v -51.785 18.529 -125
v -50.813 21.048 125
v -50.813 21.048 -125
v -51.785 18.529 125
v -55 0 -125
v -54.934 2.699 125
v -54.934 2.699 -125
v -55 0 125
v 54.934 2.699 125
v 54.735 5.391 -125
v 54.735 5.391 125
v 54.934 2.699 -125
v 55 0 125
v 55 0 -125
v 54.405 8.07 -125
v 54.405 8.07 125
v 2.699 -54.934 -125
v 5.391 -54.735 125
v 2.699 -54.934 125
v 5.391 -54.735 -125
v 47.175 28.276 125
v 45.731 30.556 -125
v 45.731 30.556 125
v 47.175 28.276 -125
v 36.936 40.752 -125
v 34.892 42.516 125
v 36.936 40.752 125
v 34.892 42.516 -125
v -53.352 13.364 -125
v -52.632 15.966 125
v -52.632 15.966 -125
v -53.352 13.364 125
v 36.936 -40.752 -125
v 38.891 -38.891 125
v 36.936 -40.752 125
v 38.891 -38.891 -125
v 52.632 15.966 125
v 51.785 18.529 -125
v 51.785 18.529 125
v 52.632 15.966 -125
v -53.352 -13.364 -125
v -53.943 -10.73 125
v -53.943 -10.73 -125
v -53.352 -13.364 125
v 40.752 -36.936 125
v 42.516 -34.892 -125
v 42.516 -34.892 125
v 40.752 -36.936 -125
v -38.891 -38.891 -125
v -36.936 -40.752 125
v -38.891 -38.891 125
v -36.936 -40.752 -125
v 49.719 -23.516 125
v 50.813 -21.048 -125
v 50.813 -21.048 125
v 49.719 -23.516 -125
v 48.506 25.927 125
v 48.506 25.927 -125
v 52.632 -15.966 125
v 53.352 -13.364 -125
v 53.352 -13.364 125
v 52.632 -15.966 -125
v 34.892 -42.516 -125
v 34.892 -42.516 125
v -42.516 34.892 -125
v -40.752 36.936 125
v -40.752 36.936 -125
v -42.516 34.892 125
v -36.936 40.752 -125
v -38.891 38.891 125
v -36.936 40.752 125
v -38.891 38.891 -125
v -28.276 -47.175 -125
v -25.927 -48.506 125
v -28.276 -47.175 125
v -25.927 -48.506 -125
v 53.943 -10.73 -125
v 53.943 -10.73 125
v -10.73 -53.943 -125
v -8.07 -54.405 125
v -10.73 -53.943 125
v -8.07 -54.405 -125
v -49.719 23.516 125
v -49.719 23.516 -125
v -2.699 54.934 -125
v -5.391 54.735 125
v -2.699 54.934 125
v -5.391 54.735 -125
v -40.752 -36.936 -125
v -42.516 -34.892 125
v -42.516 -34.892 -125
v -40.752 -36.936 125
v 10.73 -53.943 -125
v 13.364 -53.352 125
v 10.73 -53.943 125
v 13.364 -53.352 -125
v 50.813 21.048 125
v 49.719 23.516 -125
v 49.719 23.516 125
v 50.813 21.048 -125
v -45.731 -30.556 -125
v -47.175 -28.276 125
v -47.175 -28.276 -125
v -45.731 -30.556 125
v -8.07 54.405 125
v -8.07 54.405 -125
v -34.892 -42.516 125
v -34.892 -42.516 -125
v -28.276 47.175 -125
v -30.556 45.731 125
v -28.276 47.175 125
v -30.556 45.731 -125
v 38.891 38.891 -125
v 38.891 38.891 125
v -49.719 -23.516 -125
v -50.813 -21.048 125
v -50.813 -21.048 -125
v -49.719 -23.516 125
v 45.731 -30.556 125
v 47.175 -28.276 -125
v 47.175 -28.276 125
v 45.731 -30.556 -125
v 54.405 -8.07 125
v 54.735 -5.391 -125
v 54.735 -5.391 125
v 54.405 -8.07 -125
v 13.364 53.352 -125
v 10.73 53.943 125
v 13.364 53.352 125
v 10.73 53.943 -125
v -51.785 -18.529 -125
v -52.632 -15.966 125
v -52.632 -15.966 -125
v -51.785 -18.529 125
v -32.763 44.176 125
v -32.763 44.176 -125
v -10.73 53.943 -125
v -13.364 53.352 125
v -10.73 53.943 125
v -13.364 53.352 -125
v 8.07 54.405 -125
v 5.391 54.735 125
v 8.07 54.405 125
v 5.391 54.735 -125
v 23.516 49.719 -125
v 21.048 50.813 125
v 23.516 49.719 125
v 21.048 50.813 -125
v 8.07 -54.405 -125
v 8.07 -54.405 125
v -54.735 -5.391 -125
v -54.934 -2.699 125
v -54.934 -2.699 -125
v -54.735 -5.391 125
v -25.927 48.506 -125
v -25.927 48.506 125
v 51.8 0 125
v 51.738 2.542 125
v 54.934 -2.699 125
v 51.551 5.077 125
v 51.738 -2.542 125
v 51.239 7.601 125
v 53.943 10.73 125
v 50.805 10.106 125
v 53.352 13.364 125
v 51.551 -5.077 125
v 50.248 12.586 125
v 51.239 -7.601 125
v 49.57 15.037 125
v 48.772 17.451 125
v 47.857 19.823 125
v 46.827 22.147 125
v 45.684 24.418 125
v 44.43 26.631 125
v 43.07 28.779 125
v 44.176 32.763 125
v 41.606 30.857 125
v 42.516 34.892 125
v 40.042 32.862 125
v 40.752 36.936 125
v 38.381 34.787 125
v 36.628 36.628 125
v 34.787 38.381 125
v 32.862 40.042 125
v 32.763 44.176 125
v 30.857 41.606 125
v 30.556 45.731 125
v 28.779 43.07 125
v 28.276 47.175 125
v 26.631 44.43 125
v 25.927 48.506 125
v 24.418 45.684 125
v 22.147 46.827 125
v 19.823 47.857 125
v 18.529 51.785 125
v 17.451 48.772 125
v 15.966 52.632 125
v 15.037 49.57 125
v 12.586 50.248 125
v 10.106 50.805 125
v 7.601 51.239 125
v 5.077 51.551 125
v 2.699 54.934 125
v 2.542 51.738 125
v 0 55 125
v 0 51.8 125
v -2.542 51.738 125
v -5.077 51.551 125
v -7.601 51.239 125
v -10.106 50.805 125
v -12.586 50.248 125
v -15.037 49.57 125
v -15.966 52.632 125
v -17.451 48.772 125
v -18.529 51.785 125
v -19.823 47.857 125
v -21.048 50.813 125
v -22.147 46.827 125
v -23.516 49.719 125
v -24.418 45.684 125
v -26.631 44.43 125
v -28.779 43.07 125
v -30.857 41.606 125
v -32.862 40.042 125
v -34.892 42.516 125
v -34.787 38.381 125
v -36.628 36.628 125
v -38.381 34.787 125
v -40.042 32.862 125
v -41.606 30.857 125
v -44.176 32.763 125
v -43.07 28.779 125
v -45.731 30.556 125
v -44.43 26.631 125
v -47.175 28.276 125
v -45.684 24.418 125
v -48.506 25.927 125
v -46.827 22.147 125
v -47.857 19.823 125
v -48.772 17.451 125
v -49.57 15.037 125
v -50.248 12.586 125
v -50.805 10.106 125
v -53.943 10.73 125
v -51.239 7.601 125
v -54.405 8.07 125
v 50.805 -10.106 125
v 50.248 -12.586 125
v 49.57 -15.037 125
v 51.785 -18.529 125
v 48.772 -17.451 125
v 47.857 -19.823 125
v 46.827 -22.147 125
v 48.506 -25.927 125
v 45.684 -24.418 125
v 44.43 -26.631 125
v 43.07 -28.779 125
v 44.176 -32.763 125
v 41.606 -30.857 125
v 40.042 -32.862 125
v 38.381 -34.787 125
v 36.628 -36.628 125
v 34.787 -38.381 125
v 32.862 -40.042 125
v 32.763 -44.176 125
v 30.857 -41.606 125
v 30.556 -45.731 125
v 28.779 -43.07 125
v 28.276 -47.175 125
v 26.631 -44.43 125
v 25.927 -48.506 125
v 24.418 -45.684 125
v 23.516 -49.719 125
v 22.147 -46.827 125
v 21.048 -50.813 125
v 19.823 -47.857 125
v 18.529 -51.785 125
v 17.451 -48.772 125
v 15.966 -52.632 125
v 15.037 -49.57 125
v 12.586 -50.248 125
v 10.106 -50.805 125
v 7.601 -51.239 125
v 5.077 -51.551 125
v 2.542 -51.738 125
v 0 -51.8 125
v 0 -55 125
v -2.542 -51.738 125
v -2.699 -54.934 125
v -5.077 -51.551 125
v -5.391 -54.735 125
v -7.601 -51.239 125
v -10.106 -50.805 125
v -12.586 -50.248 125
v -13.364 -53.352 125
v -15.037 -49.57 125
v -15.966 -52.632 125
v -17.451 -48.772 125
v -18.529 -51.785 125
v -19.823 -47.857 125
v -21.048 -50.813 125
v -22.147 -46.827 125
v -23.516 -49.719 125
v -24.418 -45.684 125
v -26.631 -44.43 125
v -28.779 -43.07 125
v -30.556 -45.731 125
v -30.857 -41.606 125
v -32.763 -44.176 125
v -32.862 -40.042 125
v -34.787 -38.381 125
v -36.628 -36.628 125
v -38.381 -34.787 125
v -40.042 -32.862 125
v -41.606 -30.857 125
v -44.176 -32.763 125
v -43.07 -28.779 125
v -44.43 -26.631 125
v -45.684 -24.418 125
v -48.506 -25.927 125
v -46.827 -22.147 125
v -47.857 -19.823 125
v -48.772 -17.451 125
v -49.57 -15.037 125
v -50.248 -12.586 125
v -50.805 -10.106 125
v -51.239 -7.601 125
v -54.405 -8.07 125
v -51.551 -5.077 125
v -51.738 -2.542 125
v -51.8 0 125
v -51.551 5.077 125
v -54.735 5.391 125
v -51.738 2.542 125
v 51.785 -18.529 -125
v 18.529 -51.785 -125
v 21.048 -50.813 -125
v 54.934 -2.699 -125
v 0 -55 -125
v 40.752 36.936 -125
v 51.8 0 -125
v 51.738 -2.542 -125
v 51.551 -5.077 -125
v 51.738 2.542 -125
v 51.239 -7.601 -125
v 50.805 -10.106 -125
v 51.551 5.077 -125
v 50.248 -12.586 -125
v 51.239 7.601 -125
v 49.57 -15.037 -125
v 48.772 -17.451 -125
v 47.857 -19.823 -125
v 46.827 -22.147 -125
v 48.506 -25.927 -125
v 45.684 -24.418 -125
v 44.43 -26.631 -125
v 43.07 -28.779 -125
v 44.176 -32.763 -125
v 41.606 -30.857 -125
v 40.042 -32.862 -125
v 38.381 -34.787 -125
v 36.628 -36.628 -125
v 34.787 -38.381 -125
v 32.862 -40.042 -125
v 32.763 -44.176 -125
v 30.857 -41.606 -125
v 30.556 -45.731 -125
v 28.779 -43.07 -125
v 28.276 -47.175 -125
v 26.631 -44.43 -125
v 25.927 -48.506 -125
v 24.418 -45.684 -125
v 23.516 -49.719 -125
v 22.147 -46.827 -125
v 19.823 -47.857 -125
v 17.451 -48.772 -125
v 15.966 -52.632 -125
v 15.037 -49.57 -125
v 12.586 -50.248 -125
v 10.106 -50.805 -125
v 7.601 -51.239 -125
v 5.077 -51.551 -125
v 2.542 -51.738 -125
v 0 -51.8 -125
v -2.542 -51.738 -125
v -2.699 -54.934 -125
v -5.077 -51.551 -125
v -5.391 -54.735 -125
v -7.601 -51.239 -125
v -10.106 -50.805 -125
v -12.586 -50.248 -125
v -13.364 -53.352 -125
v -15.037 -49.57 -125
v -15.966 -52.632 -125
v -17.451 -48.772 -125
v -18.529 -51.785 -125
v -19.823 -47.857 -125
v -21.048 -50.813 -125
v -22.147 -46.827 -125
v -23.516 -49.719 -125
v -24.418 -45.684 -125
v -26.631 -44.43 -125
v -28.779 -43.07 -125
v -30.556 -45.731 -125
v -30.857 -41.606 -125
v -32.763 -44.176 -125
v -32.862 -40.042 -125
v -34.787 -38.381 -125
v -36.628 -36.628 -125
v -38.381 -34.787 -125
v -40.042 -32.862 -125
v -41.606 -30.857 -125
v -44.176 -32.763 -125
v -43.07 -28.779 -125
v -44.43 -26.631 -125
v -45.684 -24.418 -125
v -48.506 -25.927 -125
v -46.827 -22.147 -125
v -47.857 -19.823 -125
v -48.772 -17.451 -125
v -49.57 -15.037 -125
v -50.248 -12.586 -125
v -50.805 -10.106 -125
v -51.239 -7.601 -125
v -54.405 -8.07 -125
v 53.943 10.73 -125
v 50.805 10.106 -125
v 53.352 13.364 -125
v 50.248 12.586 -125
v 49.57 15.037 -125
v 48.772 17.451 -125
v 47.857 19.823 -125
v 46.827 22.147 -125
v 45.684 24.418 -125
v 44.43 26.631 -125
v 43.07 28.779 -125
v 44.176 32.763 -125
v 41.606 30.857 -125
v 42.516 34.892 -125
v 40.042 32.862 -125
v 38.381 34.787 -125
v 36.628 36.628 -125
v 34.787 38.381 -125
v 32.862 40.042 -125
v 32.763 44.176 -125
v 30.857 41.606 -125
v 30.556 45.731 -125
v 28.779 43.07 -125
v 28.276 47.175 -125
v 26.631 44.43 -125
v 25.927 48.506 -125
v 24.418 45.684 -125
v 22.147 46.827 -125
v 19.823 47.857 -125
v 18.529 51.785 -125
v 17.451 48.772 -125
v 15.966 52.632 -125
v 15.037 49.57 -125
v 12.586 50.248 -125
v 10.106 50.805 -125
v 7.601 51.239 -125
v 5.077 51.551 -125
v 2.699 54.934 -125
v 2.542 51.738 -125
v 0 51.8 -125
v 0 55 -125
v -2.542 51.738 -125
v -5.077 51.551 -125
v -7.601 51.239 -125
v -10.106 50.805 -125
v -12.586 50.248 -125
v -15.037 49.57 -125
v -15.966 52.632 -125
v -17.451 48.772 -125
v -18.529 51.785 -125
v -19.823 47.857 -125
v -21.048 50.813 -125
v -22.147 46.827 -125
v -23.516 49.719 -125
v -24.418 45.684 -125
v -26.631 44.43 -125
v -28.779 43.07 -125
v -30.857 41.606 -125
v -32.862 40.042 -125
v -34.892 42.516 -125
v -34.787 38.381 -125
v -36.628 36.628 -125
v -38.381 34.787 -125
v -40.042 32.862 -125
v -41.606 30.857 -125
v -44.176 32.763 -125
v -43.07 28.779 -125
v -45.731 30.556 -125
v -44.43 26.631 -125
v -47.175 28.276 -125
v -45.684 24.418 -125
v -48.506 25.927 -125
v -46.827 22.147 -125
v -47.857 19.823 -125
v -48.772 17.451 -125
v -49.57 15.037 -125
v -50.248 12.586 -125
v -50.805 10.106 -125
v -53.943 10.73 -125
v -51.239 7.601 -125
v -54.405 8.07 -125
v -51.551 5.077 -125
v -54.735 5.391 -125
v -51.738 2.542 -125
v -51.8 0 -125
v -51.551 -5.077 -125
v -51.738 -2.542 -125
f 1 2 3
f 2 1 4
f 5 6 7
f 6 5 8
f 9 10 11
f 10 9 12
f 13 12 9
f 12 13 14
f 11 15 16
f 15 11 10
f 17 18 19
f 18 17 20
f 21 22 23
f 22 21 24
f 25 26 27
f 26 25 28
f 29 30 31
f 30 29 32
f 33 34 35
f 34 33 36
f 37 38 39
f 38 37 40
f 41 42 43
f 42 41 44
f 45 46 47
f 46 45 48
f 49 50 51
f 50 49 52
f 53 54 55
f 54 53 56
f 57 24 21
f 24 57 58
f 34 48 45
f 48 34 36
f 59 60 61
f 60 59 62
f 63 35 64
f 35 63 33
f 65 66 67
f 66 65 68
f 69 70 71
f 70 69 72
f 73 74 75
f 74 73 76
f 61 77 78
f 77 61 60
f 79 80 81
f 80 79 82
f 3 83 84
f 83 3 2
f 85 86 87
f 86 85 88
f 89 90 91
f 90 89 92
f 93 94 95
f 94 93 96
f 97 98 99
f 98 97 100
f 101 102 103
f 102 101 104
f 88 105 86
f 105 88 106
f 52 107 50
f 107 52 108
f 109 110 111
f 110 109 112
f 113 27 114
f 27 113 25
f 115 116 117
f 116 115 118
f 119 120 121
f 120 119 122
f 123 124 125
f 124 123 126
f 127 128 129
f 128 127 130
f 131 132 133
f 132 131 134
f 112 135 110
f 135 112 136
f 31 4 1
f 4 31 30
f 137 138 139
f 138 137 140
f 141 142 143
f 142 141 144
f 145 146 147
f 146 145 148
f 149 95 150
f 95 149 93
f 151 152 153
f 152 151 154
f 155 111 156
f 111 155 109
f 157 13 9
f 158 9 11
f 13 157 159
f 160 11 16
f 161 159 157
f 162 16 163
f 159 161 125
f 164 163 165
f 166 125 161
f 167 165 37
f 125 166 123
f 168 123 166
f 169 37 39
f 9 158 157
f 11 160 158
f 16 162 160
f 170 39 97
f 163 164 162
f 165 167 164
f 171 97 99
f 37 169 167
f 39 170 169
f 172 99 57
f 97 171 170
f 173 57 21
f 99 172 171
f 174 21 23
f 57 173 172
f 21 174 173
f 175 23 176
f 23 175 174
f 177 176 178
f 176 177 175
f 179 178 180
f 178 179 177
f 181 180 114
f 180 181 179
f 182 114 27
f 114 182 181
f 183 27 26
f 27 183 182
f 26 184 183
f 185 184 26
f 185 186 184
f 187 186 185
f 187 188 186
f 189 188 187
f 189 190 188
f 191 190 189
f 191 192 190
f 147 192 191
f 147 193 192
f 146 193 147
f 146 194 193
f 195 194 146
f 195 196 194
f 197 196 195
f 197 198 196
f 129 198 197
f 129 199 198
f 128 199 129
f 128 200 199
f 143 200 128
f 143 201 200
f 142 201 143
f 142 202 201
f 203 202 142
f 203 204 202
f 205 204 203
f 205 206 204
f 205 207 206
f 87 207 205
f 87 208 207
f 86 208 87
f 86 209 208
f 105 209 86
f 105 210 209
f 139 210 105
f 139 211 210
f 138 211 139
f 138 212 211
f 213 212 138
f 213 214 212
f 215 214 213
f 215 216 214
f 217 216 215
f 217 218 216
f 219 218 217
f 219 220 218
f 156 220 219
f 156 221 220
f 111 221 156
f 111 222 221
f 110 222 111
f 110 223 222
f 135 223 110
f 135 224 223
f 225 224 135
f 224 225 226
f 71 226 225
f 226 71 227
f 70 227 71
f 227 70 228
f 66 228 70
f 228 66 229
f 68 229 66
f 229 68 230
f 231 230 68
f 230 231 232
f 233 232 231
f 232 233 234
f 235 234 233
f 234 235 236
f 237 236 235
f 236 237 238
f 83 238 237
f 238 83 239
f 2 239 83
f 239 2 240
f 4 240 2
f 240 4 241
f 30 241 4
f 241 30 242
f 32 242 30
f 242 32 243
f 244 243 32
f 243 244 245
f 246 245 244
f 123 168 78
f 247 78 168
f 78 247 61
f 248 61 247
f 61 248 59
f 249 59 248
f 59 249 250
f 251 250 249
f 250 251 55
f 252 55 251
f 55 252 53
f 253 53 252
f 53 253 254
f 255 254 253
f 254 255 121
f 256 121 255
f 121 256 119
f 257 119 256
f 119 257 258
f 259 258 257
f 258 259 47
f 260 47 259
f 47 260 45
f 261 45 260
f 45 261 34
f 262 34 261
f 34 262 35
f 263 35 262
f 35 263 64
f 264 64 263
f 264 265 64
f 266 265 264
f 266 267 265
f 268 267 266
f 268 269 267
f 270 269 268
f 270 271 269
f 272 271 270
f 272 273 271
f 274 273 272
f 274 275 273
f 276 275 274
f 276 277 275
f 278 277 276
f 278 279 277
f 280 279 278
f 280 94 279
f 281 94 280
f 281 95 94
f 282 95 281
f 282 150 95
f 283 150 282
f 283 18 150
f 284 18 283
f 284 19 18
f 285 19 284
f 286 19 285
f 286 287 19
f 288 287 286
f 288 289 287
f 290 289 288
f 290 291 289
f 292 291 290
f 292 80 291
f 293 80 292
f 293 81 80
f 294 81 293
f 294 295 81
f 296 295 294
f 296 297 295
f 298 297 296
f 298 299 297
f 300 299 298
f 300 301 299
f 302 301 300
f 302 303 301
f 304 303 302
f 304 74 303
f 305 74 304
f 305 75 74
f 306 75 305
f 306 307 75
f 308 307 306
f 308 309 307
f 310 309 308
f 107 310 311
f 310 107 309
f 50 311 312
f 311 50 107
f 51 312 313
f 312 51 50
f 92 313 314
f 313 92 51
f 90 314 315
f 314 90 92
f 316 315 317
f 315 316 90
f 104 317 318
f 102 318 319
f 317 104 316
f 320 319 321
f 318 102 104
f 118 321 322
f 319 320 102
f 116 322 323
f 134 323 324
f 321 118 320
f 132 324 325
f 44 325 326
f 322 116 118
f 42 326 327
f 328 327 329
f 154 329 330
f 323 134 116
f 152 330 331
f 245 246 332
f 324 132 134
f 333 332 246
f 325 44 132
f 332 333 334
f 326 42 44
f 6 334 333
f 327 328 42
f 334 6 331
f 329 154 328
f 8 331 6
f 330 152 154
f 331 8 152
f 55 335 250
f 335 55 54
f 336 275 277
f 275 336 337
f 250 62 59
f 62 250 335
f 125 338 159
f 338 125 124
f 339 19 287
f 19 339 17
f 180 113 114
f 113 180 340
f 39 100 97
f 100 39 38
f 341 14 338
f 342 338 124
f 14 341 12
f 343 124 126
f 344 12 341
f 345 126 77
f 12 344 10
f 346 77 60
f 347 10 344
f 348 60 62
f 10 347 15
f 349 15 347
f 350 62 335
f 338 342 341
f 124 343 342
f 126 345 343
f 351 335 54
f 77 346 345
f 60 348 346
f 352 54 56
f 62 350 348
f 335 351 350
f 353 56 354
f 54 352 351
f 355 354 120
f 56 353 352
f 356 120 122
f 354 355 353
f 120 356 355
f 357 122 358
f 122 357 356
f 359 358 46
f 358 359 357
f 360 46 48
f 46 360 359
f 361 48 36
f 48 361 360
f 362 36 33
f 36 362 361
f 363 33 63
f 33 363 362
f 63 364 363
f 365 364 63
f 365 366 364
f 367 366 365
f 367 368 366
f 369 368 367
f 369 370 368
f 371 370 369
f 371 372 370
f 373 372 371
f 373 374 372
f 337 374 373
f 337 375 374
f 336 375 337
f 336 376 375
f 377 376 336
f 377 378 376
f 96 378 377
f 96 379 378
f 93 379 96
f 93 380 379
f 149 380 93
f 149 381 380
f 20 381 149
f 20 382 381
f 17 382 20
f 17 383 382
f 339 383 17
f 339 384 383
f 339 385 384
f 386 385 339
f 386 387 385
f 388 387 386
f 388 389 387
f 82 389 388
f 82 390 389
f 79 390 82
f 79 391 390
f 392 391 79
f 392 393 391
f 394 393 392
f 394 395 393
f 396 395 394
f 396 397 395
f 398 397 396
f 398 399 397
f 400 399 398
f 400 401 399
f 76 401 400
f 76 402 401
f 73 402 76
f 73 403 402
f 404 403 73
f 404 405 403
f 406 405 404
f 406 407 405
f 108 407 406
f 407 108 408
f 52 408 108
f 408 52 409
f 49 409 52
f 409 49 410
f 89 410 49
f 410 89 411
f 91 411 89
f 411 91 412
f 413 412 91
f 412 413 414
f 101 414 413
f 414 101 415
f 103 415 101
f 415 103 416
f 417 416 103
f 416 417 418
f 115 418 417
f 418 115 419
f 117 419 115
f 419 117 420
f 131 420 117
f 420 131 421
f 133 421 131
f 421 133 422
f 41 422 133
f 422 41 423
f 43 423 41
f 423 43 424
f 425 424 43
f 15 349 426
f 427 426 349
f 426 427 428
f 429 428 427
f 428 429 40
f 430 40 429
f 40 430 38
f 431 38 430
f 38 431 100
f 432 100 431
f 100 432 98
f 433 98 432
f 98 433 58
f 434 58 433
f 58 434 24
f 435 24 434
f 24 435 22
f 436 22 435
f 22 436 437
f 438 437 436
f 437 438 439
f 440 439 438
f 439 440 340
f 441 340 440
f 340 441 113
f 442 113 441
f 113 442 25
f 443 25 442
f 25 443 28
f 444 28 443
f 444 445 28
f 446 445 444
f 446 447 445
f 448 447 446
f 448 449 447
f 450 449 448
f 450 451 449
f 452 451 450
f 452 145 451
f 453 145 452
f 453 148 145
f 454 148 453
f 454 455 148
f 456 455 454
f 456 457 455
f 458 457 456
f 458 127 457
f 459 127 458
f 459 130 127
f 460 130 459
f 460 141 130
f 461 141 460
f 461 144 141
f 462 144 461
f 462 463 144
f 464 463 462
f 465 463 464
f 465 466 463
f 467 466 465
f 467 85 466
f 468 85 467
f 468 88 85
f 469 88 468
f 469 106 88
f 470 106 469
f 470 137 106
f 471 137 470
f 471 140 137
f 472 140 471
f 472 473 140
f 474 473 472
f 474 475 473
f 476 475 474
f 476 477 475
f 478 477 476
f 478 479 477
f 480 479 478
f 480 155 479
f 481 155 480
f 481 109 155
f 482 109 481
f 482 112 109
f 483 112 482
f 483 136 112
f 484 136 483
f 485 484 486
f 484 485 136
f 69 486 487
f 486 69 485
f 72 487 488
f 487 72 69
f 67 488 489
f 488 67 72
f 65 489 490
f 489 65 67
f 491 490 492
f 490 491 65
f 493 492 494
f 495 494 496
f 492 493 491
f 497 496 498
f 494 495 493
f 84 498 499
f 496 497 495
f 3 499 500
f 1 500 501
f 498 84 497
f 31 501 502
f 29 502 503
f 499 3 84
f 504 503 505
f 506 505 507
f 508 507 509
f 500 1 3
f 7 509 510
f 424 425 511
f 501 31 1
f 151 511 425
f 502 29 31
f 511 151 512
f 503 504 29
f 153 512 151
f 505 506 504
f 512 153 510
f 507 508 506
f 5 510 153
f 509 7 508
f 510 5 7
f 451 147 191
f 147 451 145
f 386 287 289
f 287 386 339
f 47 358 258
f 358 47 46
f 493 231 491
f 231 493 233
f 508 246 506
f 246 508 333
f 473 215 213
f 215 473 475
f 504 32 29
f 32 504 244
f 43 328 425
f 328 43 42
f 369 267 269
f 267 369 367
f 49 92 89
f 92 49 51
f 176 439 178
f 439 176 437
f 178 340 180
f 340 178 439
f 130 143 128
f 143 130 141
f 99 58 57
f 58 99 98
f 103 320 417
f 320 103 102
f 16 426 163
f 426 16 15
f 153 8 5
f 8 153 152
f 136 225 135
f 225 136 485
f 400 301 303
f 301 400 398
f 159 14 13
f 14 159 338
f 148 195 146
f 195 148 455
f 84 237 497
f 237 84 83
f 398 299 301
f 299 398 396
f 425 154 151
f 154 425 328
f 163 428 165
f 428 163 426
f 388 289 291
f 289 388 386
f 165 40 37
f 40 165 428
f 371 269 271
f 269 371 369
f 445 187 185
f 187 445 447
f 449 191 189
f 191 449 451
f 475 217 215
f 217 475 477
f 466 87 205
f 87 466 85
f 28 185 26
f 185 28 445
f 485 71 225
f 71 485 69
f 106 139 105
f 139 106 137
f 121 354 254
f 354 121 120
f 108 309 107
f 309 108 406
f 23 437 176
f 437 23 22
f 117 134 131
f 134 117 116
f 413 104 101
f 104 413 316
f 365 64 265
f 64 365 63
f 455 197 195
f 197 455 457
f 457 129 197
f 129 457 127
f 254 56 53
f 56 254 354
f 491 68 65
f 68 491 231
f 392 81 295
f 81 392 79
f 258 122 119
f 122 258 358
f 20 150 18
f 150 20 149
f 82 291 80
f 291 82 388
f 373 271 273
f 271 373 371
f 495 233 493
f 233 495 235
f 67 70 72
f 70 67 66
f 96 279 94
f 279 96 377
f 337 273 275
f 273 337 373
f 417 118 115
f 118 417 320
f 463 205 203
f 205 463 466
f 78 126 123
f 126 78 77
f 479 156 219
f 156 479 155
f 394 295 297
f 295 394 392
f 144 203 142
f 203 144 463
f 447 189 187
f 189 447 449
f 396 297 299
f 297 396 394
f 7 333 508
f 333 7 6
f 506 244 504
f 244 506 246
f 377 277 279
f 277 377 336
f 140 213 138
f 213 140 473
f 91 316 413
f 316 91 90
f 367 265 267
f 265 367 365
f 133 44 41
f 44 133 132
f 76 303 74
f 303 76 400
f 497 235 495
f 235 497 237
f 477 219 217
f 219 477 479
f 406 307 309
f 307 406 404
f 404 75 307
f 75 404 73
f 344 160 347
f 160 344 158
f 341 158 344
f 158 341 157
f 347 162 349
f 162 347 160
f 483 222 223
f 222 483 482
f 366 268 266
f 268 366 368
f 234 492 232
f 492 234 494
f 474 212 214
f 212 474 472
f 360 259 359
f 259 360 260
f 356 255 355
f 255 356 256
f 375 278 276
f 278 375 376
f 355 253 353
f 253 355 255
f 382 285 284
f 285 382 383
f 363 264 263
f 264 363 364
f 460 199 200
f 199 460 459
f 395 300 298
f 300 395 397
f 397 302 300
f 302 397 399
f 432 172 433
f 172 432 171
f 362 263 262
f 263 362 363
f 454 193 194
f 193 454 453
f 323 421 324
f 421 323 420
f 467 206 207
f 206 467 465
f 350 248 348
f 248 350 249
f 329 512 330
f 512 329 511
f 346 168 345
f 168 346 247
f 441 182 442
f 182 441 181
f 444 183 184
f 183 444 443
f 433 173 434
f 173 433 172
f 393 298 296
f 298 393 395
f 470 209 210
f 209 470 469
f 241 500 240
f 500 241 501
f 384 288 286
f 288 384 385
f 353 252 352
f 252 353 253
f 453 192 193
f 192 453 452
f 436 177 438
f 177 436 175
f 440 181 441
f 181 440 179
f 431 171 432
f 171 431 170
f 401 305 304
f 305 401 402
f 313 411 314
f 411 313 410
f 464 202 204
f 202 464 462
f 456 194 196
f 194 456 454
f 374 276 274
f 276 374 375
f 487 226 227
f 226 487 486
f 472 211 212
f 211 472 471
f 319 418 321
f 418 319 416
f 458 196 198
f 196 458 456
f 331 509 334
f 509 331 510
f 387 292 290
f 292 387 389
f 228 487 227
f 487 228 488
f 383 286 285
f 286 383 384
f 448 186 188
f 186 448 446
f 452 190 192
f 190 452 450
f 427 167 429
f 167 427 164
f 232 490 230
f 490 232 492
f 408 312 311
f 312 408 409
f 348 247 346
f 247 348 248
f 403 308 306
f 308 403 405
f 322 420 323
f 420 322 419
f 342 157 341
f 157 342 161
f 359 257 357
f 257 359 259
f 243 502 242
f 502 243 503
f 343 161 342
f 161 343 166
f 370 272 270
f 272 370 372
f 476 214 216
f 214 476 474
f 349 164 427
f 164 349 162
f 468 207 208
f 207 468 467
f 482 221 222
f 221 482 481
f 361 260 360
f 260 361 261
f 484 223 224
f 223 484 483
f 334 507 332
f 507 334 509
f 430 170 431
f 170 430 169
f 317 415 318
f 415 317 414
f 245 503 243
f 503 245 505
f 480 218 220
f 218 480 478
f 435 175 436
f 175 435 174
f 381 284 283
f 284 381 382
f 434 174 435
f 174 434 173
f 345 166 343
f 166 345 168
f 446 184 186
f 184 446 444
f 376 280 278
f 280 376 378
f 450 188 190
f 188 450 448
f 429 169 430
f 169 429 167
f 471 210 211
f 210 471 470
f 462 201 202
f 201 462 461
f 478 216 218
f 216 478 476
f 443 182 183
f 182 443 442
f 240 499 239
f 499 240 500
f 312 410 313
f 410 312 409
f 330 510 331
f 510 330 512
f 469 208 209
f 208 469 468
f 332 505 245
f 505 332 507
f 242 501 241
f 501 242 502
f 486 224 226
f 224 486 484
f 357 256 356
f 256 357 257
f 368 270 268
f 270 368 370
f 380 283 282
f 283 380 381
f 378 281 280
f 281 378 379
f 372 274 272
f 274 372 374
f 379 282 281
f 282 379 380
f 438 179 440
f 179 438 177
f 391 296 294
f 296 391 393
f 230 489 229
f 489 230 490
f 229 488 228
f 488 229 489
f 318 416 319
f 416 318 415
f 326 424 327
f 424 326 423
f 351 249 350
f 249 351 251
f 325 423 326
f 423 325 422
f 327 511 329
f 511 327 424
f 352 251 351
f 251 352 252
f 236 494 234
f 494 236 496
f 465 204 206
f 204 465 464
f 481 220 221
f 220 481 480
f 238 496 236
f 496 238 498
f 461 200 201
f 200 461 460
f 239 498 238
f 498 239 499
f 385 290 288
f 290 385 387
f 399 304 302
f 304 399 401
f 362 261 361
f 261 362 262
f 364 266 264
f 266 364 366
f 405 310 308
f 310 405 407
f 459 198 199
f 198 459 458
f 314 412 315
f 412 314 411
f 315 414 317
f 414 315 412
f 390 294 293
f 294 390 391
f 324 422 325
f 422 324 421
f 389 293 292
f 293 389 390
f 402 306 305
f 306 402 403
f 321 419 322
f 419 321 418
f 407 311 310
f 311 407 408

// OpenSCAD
$fn=128;

module ht_pipe(od=110, length=250, wall=3.2) {
    difference() {
        cylinder(h=length, d=od, center=true);
        cylinder(h=length+2, d=od-2*wall, center=true);
    }
}

ht_pipe(od=110, length=250, wall=3.2);
